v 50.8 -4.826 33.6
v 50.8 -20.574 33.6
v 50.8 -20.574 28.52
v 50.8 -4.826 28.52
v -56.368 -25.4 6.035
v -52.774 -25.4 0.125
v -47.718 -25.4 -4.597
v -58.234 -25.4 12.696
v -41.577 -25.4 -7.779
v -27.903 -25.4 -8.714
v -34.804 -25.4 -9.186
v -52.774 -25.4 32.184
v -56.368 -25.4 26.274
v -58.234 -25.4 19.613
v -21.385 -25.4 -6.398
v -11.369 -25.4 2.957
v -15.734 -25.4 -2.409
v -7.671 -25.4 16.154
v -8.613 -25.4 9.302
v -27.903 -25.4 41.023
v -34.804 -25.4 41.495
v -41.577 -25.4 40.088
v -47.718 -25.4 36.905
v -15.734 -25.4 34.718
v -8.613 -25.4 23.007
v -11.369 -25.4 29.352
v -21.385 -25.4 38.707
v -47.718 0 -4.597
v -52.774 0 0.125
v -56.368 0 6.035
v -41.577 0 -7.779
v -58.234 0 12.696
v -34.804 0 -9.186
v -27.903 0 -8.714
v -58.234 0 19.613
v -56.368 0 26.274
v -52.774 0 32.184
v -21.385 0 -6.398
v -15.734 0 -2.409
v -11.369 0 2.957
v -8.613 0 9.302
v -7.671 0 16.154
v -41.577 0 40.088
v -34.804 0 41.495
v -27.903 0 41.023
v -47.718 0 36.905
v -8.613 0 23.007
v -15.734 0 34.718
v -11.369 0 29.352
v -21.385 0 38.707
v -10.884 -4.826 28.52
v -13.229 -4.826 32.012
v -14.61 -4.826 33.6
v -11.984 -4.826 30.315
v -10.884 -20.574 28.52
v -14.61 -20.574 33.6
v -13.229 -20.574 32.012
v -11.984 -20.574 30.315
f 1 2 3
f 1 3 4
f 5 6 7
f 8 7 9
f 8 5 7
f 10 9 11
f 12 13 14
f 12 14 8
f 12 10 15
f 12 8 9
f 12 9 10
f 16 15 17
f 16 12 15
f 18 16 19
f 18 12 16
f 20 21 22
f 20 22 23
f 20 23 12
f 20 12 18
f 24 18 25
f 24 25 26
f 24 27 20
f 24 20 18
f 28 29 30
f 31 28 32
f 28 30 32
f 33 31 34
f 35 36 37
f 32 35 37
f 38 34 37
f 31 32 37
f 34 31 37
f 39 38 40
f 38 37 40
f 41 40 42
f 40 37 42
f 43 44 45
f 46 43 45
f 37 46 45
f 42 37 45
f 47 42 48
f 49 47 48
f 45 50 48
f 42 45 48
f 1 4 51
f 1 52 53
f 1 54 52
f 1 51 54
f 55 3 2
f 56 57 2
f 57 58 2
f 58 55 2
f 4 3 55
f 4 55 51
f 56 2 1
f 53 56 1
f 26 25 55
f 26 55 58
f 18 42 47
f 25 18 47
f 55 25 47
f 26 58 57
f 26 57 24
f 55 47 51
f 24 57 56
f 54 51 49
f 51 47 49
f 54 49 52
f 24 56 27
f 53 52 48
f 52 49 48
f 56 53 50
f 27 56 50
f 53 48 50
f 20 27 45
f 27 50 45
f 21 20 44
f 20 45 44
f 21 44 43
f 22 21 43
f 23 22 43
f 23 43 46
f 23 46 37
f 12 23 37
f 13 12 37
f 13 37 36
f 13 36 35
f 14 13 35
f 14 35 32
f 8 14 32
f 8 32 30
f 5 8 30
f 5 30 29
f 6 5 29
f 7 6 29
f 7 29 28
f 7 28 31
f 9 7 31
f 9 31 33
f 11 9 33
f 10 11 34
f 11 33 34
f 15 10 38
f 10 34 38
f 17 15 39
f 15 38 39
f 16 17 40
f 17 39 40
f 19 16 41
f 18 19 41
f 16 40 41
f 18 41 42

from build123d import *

# Parameters (mm, degrees)
F0_R          = 25.4
F1_DEPTH      = 25.4
F2_W          = 15.748
F2_H          = 5.08
F3_DEPTH      = 50.8
F3_DEPTH_BACK = 25.4


with BuildPart() as f1:
    # F0 (on Front) → F1 (new body)
    with BuildSketch(Plane.XZ):
        with Locations((-33.070799, 16.154399)):
            Circle(F0_R)
    extrude(amount=F1_DEPTH)

    # F2 (on Right) → F3 (join, two sides)
    with BuildSketch(Plane.YZ) as f3_sk:
        with Locations((-12.7, 31.060102)):
            Rectangle(F2_W, F2_H)
    extrude(amount=F3_DEPTH)
    extrude(f3_sk.sketch, amount=-F3_DEPTH_BACK)


solid = f1.part
